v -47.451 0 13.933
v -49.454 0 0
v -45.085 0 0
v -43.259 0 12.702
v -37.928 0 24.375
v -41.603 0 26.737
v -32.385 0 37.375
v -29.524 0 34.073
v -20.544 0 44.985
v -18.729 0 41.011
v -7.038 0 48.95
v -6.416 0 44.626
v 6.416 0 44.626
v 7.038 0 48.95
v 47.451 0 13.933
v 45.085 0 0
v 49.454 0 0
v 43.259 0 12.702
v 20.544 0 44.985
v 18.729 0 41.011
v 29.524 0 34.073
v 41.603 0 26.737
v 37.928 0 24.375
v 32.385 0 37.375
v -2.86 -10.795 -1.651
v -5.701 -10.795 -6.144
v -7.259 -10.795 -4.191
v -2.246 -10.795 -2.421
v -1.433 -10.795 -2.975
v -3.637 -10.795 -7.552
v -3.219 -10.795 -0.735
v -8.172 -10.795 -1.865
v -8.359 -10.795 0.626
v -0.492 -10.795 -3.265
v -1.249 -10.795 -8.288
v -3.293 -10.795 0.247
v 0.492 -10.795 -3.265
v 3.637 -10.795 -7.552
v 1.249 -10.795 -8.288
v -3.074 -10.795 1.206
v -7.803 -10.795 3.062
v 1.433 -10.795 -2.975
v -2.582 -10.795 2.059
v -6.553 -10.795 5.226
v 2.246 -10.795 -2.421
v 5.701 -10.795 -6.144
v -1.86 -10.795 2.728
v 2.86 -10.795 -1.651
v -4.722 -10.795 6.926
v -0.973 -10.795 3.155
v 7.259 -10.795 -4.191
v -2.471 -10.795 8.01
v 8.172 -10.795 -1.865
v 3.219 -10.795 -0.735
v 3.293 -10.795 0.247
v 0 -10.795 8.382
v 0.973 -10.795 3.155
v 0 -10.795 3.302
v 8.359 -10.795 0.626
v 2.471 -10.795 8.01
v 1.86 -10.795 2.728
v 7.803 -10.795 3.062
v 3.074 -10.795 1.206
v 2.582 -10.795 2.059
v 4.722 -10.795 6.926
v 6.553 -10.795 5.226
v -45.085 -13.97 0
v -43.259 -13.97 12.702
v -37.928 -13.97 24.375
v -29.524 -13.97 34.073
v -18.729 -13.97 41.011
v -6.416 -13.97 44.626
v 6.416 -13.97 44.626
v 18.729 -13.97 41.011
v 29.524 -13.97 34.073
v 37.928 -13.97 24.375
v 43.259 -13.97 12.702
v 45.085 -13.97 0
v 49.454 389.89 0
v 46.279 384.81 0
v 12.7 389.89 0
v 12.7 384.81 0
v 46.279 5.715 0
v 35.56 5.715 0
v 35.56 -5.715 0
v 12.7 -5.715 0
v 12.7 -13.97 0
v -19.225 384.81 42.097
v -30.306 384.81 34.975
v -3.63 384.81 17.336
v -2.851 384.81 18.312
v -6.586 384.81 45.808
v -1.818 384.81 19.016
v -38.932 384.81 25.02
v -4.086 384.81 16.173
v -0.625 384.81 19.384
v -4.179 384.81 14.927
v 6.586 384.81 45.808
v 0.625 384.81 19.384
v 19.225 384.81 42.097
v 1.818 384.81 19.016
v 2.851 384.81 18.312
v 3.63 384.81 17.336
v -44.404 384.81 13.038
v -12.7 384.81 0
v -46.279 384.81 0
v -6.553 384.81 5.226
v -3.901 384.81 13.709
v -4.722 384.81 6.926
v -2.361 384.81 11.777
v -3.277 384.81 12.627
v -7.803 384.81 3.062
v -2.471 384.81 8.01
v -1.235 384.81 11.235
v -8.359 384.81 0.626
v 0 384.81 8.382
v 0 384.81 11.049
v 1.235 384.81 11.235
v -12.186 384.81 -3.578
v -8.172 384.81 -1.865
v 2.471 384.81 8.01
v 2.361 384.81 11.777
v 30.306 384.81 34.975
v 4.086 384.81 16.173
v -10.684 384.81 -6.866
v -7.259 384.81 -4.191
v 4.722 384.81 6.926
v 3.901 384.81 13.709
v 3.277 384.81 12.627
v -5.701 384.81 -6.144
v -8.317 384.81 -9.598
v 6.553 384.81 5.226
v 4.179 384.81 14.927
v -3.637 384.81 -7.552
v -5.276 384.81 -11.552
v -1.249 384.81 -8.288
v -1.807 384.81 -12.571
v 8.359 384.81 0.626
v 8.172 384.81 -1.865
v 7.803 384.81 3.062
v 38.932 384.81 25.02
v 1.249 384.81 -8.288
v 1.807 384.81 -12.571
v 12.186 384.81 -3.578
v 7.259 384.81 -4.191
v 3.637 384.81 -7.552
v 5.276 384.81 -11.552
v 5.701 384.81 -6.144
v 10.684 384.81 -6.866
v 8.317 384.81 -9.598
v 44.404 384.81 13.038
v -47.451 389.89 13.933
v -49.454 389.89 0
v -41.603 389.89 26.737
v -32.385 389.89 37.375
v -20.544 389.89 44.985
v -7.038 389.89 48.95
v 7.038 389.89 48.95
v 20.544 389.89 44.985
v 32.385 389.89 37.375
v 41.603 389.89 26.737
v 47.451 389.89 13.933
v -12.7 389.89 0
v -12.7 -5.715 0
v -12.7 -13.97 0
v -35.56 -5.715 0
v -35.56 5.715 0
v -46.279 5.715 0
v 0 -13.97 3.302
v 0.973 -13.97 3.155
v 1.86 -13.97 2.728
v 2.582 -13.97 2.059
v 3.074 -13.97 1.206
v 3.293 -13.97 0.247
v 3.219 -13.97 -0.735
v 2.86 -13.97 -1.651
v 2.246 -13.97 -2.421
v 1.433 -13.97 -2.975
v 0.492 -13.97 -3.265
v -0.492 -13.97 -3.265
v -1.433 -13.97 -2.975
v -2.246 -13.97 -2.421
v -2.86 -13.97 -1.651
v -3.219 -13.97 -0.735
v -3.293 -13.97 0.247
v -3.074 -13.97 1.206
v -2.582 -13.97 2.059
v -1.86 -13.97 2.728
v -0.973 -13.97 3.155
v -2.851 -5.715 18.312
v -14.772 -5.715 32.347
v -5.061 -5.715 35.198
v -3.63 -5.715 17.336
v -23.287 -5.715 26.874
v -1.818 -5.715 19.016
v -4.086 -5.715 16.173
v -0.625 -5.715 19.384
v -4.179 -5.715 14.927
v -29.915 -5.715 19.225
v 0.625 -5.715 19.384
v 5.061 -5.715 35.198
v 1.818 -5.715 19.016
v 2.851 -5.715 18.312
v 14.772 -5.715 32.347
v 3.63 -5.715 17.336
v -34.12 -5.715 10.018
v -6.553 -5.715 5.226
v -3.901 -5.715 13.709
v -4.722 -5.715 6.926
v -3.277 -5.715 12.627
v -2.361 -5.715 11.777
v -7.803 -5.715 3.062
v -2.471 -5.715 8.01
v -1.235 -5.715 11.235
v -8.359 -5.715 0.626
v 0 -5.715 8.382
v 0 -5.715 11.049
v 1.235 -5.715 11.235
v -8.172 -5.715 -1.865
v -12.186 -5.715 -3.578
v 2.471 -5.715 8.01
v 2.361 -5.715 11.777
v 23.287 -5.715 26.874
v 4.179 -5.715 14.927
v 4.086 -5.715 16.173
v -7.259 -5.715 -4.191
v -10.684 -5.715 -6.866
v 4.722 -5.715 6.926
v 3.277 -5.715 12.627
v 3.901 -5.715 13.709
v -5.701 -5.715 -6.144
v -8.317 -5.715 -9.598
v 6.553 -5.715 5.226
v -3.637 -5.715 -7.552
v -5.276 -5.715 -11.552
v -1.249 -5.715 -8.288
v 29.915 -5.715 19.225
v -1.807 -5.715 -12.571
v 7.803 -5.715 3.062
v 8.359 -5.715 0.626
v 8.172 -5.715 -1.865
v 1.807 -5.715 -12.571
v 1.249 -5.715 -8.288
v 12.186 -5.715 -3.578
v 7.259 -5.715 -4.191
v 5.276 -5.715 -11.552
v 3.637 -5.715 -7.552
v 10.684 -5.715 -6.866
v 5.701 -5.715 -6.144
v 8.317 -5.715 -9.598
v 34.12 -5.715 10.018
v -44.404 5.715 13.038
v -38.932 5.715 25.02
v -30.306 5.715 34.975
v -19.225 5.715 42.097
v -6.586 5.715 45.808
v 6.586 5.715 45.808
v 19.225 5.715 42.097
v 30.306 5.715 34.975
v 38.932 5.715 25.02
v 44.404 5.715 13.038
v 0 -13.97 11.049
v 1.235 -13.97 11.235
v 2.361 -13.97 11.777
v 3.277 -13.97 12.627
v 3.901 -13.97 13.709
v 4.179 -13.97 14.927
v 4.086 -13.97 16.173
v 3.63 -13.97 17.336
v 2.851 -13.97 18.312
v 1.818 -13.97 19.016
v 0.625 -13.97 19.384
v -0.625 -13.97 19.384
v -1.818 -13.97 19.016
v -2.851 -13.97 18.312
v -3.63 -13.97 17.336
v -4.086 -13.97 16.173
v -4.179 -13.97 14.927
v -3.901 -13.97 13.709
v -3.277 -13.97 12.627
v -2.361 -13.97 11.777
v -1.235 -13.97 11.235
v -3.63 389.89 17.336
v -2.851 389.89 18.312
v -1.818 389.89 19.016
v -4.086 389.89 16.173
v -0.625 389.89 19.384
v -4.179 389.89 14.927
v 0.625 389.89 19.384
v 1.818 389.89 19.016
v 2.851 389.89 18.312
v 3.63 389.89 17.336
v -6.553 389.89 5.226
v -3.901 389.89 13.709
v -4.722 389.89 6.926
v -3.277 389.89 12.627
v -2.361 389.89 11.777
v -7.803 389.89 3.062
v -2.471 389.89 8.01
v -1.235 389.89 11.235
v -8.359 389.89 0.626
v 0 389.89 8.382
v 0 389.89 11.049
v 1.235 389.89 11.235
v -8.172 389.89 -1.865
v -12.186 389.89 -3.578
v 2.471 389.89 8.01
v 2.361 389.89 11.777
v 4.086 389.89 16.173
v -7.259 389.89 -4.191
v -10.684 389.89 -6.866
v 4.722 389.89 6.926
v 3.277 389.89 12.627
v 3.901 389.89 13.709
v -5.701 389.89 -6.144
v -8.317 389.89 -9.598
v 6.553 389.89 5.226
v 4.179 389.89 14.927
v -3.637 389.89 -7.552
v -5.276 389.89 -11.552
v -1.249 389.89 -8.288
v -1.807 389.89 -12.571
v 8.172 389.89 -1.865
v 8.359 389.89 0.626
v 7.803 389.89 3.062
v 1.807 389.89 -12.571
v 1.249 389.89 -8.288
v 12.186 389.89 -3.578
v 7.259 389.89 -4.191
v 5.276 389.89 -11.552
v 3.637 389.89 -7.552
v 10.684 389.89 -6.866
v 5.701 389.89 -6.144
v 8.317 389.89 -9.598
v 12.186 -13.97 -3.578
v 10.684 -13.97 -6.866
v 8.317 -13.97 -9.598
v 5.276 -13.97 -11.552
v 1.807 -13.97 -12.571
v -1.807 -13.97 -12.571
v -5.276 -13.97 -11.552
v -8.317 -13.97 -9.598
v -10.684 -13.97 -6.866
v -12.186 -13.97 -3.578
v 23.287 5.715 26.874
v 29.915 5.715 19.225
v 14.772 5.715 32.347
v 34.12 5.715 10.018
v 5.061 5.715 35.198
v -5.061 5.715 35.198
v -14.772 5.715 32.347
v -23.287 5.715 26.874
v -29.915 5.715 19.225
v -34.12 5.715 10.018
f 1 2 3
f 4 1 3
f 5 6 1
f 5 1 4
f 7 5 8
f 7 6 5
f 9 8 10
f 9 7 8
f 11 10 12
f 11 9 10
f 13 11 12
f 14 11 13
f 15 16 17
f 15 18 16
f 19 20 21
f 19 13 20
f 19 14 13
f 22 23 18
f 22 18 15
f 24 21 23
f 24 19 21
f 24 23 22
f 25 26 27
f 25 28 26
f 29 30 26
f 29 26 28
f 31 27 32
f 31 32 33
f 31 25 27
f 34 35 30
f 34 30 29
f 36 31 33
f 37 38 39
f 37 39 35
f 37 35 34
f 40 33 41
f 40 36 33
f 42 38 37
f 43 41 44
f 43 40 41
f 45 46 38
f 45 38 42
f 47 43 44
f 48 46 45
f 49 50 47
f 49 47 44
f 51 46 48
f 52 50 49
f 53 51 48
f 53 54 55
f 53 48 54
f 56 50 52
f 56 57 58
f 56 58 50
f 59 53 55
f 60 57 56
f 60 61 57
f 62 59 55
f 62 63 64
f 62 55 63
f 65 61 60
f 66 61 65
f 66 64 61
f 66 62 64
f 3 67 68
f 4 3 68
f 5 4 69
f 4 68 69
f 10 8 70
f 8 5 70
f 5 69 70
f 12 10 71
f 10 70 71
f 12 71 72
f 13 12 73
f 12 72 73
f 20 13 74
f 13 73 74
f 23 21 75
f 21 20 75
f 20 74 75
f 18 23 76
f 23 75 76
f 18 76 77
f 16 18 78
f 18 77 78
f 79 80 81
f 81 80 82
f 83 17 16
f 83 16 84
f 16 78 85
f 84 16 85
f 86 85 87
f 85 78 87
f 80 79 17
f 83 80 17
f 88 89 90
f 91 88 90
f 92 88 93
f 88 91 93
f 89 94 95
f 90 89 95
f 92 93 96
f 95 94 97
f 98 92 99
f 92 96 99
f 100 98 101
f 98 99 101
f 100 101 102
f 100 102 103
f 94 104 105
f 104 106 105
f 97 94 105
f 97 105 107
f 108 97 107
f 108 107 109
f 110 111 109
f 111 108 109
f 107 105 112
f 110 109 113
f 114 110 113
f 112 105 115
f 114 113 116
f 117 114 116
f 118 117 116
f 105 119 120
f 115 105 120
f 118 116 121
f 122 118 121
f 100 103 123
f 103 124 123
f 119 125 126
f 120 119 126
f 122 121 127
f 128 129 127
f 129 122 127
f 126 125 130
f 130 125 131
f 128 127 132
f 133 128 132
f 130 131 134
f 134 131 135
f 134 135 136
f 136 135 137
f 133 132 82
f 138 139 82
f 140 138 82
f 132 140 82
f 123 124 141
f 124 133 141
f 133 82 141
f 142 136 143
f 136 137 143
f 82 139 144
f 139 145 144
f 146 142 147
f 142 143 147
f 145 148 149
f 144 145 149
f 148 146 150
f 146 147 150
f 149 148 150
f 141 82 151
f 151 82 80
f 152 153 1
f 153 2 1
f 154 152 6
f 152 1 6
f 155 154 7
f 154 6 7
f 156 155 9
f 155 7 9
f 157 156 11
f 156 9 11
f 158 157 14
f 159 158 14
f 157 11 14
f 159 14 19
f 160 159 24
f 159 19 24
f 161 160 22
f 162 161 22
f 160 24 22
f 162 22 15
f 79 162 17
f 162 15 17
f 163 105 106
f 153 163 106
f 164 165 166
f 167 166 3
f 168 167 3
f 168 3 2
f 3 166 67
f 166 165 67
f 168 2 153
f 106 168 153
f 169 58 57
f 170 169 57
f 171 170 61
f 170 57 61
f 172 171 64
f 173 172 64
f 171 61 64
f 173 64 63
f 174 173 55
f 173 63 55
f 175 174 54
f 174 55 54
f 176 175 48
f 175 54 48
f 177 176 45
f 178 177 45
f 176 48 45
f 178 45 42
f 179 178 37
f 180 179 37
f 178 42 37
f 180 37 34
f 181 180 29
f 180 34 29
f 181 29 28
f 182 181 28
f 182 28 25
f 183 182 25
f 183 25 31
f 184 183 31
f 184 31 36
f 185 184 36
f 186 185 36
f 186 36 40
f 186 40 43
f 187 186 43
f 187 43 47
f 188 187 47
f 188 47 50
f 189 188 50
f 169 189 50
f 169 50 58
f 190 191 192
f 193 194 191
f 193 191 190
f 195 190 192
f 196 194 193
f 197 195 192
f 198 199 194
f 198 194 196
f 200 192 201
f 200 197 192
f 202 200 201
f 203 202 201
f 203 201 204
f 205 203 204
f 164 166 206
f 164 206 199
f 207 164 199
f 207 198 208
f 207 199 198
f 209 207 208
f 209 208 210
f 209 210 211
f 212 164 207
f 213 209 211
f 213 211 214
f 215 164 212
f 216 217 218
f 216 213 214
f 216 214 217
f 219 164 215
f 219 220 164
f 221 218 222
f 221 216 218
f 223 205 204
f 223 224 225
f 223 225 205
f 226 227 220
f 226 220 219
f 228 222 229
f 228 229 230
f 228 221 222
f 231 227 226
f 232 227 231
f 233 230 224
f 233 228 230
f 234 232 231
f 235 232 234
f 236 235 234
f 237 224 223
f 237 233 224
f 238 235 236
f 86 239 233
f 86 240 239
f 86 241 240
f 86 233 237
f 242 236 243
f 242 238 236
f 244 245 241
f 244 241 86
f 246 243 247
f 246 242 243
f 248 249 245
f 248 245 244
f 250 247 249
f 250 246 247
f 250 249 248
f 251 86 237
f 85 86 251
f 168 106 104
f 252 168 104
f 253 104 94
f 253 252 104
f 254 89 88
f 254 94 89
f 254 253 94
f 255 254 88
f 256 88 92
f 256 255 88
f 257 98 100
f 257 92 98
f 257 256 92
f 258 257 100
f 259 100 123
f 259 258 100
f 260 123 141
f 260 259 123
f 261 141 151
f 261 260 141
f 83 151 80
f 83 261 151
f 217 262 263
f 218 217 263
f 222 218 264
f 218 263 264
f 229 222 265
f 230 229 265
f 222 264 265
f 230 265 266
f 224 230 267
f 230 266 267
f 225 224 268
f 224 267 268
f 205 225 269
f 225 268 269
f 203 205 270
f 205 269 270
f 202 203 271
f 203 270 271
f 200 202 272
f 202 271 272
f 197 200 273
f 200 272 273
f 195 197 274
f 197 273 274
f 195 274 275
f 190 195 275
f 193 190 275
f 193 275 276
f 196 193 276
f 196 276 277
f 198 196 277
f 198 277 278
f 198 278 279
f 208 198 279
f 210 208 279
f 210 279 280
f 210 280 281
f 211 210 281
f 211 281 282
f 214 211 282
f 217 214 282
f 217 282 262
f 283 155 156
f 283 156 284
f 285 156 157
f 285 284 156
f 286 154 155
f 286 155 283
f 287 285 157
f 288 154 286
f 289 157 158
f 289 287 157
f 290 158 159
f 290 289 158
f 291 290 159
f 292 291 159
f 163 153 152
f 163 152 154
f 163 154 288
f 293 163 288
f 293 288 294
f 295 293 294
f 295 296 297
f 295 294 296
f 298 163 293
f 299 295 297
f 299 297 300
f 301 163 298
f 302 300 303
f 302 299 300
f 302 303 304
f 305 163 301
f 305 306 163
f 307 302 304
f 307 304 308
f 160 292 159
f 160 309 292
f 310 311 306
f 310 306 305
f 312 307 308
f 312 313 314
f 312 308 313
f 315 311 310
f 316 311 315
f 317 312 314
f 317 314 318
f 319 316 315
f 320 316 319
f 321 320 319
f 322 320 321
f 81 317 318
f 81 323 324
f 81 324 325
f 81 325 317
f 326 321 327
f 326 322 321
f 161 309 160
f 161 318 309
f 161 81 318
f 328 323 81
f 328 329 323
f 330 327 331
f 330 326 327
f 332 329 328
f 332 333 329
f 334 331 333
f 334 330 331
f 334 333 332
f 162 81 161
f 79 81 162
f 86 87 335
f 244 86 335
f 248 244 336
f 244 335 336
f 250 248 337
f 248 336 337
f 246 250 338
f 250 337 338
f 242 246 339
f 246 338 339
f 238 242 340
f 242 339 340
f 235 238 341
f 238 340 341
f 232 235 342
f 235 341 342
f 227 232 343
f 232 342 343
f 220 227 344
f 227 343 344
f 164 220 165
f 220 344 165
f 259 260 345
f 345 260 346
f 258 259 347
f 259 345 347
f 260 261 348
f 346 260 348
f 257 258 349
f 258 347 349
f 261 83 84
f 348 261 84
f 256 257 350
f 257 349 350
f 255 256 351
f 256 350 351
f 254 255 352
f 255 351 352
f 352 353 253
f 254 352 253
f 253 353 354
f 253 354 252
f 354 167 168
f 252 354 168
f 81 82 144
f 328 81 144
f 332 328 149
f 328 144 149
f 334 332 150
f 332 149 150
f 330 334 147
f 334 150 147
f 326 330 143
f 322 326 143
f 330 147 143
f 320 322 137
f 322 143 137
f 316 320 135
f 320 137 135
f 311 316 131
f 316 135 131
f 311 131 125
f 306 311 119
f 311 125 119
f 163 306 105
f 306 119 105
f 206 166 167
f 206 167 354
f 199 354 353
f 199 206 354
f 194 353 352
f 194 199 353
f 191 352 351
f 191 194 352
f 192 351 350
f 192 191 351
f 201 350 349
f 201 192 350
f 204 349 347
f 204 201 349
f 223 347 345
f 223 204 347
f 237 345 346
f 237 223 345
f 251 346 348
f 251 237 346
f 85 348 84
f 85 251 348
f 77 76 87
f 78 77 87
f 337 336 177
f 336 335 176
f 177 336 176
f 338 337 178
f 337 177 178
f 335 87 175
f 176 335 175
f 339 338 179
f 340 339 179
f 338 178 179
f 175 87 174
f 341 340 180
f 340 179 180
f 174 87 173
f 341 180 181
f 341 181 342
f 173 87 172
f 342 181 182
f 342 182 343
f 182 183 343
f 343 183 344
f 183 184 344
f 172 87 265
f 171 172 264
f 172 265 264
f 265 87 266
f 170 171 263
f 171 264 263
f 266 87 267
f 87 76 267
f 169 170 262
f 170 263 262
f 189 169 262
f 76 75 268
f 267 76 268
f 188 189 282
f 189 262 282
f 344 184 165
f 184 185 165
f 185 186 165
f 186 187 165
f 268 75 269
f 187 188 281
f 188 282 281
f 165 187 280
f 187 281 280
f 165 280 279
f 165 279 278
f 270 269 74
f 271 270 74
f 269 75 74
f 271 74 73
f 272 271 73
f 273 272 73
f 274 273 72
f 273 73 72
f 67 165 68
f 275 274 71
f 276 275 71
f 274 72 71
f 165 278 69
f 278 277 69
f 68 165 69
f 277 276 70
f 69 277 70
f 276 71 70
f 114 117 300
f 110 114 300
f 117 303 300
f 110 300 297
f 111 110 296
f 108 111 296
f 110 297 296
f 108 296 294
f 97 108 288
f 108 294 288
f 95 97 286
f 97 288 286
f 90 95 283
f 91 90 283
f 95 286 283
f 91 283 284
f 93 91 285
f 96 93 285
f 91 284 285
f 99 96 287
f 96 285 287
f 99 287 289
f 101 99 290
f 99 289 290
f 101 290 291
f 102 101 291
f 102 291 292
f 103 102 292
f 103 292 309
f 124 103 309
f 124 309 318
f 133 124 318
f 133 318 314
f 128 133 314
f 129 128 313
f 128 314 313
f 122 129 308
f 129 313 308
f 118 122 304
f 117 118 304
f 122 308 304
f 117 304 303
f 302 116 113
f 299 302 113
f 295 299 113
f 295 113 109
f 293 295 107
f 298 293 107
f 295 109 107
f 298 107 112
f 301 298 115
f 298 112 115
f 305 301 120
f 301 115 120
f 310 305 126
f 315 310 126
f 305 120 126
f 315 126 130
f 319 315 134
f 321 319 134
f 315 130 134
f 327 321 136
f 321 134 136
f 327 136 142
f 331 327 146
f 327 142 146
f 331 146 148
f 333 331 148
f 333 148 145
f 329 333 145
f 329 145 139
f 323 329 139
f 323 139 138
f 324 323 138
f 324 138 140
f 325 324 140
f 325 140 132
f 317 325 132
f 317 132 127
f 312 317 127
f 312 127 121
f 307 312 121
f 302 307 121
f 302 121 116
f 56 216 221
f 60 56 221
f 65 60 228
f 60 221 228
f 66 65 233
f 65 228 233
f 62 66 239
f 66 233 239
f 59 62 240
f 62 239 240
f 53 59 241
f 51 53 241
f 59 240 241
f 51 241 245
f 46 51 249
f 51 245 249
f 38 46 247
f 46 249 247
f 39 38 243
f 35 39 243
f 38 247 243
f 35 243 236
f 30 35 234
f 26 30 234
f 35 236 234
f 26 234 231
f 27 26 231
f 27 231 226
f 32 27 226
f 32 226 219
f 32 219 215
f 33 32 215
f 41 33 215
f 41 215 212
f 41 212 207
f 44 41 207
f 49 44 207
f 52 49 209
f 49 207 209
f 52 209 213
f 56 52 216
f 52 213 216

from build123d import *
from build123d.topology import SkipClean

# Parameters (mm, degrees)
BOSS_EXTRUDE1_DEPTH      = 3.81
BOSS_EXTRUDE1_DEPTH_BACK = 6.35
SKETCH1_R                = 49.4538
SKETCH2_R                = 49.4538
BOSS_EXTRUDE2_DEPTH      = 381
SHELL1_T                 = -3.175
CUT_EXTRUDE1_DEPTH       = 398.363186857
BOSS_EXTRUDE3_DEPTH      = 3.81
SKETCH7_R                = 49.4538
SKETCH7_R_2              = 45.085
CUT_EXTRUDE2_DEPTH       = 6.35
BOSS_EXTRUDE4_START      = 7.62
BOSS_EXTRUDE4_DEPTH      = 7.62
SKETCH10_R               = 35.56
CUT_EXTRUDE3_DEPTH       = 6.35
SKETCH11_R               = 8.382
CUT_EXTRUDE4_DEPTH       = 5.08
SKETCH12_R               = 3.302
CUT_EXTRUDE5_DEPTH       = 402.739558289
BOSS_EXTRUDE5_DEPTH      = 5.08
SKETCH14_R               = 4.191
CUT_EXTRUDE6_DEPTH       = 405.866453376
BOSS_EXTRUDE6_DEPTH      = 5.08
SKETCH16_R               = 8.382
CUT_EXTRUDE7_DEPTH       = 405.866453376
CUT_EXTRUDE8_REACH       = 411.871
SKETCH17_R               = 4.191


with BuildPart() as part:
    # Sketch1 → Boss-Extrude1 (new, two sides: drawn at the far end of the back side and taken through both)
    with BuildSketch(Plane(origin=(0, 0, 0), x_dir=(1, 0, 0), z_dir=(0, 1, 0)).offset(-BOSS_EXTRUDE1_DEPTH_BACK)):
        Circle(SKETCH1_R)
    extrude(amount=BOSS_EXTRUDE1_DEPTH + BOSS_EXTRUDE1_DEPTH_BACK)

    # Sketch2 → Boss-Extrude2 (add)
    with BuildSketch(Plane(origin=(0, 3.81, 0), x_dir=(1, 0, 0), z_dir=(0, 1, 0))):
        Circle(SKETCH2_R)
    extrude(amount=BOSS_EXTRUDE2_DEPTH)

    # Shell1
    shell1_openings = [part.faces().sort_by_distance(p)[0] for p in [
        (0, 384.81, 0),
    ]]
    offset(amount=SHELL1_T, openings=shell1_openings, kind=Kind.INTERSECTION)

    # Sketch4 → Cut-Extrude1 (cut, through all)
    with BuildSketch(Plane.XZ.offset(6.35)):
        with BuildLine():
            Line((49.4538, 0), (12.7, 0))
            ThreePointArc((12.7, 0), (0, -12.7), (-12.7, 0))
            Line((-12.7, 0), (-49.4538, 0))
            ThreePointArc((-49.4538, 0), (0, -49.4538), (49.4538, 0))
        make_face()
    extrude(amount=-CUT_EXTRUDE1_DEPTH, mode=Mode.SUBTRACT)

    # Sketch5 → Boss-Extrude3 (add)
    with BuildSketch(Plane(origin=(0, -3.175, 0), x_dir=(1, 0, 0), z_dir=(0, 1, 0))):
        with BuildLine():
            Line((-46.2788, 0), (-12.7, 0))
            ThreePointArc((-12.7, 0), (0, 12.7), (12.7, 0))
            Line((12.7, 0), (46.2788, 0))
            ThreePointArc((46.2788, 0), (0, -46.2788), (-46.2788, 0))
        make_face()
    extrude(amount=BOSS_EXTRUDE3_DEPTH)

    # Sketch7 → Cut-Extrude2 (cut)
    with BuildSketch(Plane.XZ.offset(6.35)):
        Circle(SKETCH7_R)
        Circle(SKETCH7_R_2, mode=Mode.SUBTRACT)
    extrude(amount=-CUT_EXTRUDE2_DEPTH, mode=Mode.SUBTRACT)

    # Sketch9 → Boss-Extrude4 (add)
    with SkipClean():  # the faces are left unmerged after this step: merging them gives an invalid solid
        with BuildSketch(Plane.XZ.offset(6.35).offset(BOSS_EXTRUDE4_START)):
            with BuildLine():
                Line((45.085, 0), (12.7, 0))
                ThreePointArc((12.7, 0), (0, -12.7), (-12.7, 0))
                Line((-12.7, 0), (-45.085, 0))
                ThreePointArc((-45.085, 0), (0, 45.085), (45.085, 0))
            make_face()
        extrude(amount=-BOSS_EXTRUDE4_DEPTH)
    add(part.part.scale(1), mode=Mode.REPLACE)  # the faces are merged on a copy

    # Sketch10 → Cut-Extrude3 (cut)
    with BuildSketch(Plane(origin=(0, 0.635, 0), x_dir=(1, 0, 0), z_dir=(0, 1, 0))):
        Circle(SKETCH10_R)
    extrude(amount=-CUT_EXTRUDE3_DEPTH, mode=Mode.SUBTRACT)

    # Sketch11 → Cut-Extrude4 (cut)
    with BuildSketch(Plane(origin=(0, -5.715, 0), x_dir=(1, 0, 0), z_dir=(0, 1, 0))):
        Circle(SKETCH11_R)
    extrude(amount=-CUT_EXTRUDE4_DEPTH, mode=Mode.SUBTRACT)

    # Sketch12 → Cut-Extrude5 (cut, through all)
    with BuildSketch(Plane(origin=(0, -10.795, 0), x_dir=(1, 0, 0), z_dir=(0, 1, 0))):
        Circle(SKETCH12_R)
    extrude(amount=-CUT_EXTRUDE5_DEPTH, mode=Mode.SUBTRACT)

    # Sketch13 → Boss-Extrude5 (add)
    with SkipClean():  # the faces are left unmerged after this step: merging them gives an invalid solid
        with BuildSketch(Plane(origin=(0, 0.635, 0), x_dir=(1, 0, 0), z_dir=(0, 1, 0))):
            with BuildLine():
                Line((-46.2788, 0), (-35.56, 0))
                ThreePointArc((-35.56, 0), (0, -35.56), (35.56, 0))
                Line((35.56, 0), (46.2788, 0))
                ThreePointArc((46.2788, 0), (0, -46.2788), (-46.2788, 0))
            make_face()
        extrude(amount=BOSS_EXTRUDE5_DEPTH)
    add(part.part.scale(1), mode=Mode.REPLACE)  # the faces are merged on a copy

    # Sketch14 → Cut-Extrude6 (cut, through all)
    with BuildSketch(Plane.XZ.offset(13.97)):
        with Locations((0, 15.24)):
            Circle(SKETCH14_R)
    extrude(amount=-CUT_EXTRUDE6_DEPTH, mode=Mode.SUBTRACT)

    # Sketch15 → Boss-Extrude6 (add)
    with SkipClean():  # the faces are left unmerged after this step: merging them gives an invalid solid
        with BuildSketch(Plane(origin=(0, 384.81, 0), x_dir=(1, 0, 0), z_dir=(0, 1, 0))):
            with BuildLine():
                Line((46.2788, 0), (35.56, 0))
                Line((35.56, 0), (12.7, 0))
                ThreePointArc((12.7, 0), (0, 12.7), (-12.7, 0))
                Line((-12.7, 0), (-35.56, 0))
                Line((-35.56, 0), (-46.2788, 0))
                Line((-46.2788, 0), (-49.4538, 0))
                ThreePointArc((-49.4538, 0), (0, -49.4538), (49.4538, 0))
                Line((49.4538, 0), (46.2788, 0))
            make_face()
        extrude(amount=BOSS_EXTRUDE6_DEPTH)

    # Sketch16 → Cut-Extrude7 (cut, through all)
    with SkipClean():  # the faces are left unmerged after this step: merging them gives an invalid solid
        with BuildSketch(Plane.XZ.offset(-384.81)):
            Circle(SKETCH16_R)
        extrude(amount=-CUT_EXTRUDE7_DEPTH, mode=Mode.SUBTRACT)

    # Sketch17 → Cut-Extrude8 (cut, up to next)
    with BuildSketch(Plane(origin=(0, 389.89, 0), x_dir=(1, 0, 0), z_dir=(0, 1, 0)), mode=Mode.PRIVATE) as cut_extrude8_sk1:
        with Locations((0, -15.24)):
            Circle(SKETCH17_R)
    cut_extrude8_tool1 = extrude(cut_extrude8_sk1.sketch, amount=-CUT_EXTRUDE8_REACH, mode=Mode.PRIVATE) & part.part
    add(cut_extrude8_tool1.solids().sort_by_distance((0, 389.89, 15.24))[0], mode=Mode.SUBTRACT)


solid = part.part
